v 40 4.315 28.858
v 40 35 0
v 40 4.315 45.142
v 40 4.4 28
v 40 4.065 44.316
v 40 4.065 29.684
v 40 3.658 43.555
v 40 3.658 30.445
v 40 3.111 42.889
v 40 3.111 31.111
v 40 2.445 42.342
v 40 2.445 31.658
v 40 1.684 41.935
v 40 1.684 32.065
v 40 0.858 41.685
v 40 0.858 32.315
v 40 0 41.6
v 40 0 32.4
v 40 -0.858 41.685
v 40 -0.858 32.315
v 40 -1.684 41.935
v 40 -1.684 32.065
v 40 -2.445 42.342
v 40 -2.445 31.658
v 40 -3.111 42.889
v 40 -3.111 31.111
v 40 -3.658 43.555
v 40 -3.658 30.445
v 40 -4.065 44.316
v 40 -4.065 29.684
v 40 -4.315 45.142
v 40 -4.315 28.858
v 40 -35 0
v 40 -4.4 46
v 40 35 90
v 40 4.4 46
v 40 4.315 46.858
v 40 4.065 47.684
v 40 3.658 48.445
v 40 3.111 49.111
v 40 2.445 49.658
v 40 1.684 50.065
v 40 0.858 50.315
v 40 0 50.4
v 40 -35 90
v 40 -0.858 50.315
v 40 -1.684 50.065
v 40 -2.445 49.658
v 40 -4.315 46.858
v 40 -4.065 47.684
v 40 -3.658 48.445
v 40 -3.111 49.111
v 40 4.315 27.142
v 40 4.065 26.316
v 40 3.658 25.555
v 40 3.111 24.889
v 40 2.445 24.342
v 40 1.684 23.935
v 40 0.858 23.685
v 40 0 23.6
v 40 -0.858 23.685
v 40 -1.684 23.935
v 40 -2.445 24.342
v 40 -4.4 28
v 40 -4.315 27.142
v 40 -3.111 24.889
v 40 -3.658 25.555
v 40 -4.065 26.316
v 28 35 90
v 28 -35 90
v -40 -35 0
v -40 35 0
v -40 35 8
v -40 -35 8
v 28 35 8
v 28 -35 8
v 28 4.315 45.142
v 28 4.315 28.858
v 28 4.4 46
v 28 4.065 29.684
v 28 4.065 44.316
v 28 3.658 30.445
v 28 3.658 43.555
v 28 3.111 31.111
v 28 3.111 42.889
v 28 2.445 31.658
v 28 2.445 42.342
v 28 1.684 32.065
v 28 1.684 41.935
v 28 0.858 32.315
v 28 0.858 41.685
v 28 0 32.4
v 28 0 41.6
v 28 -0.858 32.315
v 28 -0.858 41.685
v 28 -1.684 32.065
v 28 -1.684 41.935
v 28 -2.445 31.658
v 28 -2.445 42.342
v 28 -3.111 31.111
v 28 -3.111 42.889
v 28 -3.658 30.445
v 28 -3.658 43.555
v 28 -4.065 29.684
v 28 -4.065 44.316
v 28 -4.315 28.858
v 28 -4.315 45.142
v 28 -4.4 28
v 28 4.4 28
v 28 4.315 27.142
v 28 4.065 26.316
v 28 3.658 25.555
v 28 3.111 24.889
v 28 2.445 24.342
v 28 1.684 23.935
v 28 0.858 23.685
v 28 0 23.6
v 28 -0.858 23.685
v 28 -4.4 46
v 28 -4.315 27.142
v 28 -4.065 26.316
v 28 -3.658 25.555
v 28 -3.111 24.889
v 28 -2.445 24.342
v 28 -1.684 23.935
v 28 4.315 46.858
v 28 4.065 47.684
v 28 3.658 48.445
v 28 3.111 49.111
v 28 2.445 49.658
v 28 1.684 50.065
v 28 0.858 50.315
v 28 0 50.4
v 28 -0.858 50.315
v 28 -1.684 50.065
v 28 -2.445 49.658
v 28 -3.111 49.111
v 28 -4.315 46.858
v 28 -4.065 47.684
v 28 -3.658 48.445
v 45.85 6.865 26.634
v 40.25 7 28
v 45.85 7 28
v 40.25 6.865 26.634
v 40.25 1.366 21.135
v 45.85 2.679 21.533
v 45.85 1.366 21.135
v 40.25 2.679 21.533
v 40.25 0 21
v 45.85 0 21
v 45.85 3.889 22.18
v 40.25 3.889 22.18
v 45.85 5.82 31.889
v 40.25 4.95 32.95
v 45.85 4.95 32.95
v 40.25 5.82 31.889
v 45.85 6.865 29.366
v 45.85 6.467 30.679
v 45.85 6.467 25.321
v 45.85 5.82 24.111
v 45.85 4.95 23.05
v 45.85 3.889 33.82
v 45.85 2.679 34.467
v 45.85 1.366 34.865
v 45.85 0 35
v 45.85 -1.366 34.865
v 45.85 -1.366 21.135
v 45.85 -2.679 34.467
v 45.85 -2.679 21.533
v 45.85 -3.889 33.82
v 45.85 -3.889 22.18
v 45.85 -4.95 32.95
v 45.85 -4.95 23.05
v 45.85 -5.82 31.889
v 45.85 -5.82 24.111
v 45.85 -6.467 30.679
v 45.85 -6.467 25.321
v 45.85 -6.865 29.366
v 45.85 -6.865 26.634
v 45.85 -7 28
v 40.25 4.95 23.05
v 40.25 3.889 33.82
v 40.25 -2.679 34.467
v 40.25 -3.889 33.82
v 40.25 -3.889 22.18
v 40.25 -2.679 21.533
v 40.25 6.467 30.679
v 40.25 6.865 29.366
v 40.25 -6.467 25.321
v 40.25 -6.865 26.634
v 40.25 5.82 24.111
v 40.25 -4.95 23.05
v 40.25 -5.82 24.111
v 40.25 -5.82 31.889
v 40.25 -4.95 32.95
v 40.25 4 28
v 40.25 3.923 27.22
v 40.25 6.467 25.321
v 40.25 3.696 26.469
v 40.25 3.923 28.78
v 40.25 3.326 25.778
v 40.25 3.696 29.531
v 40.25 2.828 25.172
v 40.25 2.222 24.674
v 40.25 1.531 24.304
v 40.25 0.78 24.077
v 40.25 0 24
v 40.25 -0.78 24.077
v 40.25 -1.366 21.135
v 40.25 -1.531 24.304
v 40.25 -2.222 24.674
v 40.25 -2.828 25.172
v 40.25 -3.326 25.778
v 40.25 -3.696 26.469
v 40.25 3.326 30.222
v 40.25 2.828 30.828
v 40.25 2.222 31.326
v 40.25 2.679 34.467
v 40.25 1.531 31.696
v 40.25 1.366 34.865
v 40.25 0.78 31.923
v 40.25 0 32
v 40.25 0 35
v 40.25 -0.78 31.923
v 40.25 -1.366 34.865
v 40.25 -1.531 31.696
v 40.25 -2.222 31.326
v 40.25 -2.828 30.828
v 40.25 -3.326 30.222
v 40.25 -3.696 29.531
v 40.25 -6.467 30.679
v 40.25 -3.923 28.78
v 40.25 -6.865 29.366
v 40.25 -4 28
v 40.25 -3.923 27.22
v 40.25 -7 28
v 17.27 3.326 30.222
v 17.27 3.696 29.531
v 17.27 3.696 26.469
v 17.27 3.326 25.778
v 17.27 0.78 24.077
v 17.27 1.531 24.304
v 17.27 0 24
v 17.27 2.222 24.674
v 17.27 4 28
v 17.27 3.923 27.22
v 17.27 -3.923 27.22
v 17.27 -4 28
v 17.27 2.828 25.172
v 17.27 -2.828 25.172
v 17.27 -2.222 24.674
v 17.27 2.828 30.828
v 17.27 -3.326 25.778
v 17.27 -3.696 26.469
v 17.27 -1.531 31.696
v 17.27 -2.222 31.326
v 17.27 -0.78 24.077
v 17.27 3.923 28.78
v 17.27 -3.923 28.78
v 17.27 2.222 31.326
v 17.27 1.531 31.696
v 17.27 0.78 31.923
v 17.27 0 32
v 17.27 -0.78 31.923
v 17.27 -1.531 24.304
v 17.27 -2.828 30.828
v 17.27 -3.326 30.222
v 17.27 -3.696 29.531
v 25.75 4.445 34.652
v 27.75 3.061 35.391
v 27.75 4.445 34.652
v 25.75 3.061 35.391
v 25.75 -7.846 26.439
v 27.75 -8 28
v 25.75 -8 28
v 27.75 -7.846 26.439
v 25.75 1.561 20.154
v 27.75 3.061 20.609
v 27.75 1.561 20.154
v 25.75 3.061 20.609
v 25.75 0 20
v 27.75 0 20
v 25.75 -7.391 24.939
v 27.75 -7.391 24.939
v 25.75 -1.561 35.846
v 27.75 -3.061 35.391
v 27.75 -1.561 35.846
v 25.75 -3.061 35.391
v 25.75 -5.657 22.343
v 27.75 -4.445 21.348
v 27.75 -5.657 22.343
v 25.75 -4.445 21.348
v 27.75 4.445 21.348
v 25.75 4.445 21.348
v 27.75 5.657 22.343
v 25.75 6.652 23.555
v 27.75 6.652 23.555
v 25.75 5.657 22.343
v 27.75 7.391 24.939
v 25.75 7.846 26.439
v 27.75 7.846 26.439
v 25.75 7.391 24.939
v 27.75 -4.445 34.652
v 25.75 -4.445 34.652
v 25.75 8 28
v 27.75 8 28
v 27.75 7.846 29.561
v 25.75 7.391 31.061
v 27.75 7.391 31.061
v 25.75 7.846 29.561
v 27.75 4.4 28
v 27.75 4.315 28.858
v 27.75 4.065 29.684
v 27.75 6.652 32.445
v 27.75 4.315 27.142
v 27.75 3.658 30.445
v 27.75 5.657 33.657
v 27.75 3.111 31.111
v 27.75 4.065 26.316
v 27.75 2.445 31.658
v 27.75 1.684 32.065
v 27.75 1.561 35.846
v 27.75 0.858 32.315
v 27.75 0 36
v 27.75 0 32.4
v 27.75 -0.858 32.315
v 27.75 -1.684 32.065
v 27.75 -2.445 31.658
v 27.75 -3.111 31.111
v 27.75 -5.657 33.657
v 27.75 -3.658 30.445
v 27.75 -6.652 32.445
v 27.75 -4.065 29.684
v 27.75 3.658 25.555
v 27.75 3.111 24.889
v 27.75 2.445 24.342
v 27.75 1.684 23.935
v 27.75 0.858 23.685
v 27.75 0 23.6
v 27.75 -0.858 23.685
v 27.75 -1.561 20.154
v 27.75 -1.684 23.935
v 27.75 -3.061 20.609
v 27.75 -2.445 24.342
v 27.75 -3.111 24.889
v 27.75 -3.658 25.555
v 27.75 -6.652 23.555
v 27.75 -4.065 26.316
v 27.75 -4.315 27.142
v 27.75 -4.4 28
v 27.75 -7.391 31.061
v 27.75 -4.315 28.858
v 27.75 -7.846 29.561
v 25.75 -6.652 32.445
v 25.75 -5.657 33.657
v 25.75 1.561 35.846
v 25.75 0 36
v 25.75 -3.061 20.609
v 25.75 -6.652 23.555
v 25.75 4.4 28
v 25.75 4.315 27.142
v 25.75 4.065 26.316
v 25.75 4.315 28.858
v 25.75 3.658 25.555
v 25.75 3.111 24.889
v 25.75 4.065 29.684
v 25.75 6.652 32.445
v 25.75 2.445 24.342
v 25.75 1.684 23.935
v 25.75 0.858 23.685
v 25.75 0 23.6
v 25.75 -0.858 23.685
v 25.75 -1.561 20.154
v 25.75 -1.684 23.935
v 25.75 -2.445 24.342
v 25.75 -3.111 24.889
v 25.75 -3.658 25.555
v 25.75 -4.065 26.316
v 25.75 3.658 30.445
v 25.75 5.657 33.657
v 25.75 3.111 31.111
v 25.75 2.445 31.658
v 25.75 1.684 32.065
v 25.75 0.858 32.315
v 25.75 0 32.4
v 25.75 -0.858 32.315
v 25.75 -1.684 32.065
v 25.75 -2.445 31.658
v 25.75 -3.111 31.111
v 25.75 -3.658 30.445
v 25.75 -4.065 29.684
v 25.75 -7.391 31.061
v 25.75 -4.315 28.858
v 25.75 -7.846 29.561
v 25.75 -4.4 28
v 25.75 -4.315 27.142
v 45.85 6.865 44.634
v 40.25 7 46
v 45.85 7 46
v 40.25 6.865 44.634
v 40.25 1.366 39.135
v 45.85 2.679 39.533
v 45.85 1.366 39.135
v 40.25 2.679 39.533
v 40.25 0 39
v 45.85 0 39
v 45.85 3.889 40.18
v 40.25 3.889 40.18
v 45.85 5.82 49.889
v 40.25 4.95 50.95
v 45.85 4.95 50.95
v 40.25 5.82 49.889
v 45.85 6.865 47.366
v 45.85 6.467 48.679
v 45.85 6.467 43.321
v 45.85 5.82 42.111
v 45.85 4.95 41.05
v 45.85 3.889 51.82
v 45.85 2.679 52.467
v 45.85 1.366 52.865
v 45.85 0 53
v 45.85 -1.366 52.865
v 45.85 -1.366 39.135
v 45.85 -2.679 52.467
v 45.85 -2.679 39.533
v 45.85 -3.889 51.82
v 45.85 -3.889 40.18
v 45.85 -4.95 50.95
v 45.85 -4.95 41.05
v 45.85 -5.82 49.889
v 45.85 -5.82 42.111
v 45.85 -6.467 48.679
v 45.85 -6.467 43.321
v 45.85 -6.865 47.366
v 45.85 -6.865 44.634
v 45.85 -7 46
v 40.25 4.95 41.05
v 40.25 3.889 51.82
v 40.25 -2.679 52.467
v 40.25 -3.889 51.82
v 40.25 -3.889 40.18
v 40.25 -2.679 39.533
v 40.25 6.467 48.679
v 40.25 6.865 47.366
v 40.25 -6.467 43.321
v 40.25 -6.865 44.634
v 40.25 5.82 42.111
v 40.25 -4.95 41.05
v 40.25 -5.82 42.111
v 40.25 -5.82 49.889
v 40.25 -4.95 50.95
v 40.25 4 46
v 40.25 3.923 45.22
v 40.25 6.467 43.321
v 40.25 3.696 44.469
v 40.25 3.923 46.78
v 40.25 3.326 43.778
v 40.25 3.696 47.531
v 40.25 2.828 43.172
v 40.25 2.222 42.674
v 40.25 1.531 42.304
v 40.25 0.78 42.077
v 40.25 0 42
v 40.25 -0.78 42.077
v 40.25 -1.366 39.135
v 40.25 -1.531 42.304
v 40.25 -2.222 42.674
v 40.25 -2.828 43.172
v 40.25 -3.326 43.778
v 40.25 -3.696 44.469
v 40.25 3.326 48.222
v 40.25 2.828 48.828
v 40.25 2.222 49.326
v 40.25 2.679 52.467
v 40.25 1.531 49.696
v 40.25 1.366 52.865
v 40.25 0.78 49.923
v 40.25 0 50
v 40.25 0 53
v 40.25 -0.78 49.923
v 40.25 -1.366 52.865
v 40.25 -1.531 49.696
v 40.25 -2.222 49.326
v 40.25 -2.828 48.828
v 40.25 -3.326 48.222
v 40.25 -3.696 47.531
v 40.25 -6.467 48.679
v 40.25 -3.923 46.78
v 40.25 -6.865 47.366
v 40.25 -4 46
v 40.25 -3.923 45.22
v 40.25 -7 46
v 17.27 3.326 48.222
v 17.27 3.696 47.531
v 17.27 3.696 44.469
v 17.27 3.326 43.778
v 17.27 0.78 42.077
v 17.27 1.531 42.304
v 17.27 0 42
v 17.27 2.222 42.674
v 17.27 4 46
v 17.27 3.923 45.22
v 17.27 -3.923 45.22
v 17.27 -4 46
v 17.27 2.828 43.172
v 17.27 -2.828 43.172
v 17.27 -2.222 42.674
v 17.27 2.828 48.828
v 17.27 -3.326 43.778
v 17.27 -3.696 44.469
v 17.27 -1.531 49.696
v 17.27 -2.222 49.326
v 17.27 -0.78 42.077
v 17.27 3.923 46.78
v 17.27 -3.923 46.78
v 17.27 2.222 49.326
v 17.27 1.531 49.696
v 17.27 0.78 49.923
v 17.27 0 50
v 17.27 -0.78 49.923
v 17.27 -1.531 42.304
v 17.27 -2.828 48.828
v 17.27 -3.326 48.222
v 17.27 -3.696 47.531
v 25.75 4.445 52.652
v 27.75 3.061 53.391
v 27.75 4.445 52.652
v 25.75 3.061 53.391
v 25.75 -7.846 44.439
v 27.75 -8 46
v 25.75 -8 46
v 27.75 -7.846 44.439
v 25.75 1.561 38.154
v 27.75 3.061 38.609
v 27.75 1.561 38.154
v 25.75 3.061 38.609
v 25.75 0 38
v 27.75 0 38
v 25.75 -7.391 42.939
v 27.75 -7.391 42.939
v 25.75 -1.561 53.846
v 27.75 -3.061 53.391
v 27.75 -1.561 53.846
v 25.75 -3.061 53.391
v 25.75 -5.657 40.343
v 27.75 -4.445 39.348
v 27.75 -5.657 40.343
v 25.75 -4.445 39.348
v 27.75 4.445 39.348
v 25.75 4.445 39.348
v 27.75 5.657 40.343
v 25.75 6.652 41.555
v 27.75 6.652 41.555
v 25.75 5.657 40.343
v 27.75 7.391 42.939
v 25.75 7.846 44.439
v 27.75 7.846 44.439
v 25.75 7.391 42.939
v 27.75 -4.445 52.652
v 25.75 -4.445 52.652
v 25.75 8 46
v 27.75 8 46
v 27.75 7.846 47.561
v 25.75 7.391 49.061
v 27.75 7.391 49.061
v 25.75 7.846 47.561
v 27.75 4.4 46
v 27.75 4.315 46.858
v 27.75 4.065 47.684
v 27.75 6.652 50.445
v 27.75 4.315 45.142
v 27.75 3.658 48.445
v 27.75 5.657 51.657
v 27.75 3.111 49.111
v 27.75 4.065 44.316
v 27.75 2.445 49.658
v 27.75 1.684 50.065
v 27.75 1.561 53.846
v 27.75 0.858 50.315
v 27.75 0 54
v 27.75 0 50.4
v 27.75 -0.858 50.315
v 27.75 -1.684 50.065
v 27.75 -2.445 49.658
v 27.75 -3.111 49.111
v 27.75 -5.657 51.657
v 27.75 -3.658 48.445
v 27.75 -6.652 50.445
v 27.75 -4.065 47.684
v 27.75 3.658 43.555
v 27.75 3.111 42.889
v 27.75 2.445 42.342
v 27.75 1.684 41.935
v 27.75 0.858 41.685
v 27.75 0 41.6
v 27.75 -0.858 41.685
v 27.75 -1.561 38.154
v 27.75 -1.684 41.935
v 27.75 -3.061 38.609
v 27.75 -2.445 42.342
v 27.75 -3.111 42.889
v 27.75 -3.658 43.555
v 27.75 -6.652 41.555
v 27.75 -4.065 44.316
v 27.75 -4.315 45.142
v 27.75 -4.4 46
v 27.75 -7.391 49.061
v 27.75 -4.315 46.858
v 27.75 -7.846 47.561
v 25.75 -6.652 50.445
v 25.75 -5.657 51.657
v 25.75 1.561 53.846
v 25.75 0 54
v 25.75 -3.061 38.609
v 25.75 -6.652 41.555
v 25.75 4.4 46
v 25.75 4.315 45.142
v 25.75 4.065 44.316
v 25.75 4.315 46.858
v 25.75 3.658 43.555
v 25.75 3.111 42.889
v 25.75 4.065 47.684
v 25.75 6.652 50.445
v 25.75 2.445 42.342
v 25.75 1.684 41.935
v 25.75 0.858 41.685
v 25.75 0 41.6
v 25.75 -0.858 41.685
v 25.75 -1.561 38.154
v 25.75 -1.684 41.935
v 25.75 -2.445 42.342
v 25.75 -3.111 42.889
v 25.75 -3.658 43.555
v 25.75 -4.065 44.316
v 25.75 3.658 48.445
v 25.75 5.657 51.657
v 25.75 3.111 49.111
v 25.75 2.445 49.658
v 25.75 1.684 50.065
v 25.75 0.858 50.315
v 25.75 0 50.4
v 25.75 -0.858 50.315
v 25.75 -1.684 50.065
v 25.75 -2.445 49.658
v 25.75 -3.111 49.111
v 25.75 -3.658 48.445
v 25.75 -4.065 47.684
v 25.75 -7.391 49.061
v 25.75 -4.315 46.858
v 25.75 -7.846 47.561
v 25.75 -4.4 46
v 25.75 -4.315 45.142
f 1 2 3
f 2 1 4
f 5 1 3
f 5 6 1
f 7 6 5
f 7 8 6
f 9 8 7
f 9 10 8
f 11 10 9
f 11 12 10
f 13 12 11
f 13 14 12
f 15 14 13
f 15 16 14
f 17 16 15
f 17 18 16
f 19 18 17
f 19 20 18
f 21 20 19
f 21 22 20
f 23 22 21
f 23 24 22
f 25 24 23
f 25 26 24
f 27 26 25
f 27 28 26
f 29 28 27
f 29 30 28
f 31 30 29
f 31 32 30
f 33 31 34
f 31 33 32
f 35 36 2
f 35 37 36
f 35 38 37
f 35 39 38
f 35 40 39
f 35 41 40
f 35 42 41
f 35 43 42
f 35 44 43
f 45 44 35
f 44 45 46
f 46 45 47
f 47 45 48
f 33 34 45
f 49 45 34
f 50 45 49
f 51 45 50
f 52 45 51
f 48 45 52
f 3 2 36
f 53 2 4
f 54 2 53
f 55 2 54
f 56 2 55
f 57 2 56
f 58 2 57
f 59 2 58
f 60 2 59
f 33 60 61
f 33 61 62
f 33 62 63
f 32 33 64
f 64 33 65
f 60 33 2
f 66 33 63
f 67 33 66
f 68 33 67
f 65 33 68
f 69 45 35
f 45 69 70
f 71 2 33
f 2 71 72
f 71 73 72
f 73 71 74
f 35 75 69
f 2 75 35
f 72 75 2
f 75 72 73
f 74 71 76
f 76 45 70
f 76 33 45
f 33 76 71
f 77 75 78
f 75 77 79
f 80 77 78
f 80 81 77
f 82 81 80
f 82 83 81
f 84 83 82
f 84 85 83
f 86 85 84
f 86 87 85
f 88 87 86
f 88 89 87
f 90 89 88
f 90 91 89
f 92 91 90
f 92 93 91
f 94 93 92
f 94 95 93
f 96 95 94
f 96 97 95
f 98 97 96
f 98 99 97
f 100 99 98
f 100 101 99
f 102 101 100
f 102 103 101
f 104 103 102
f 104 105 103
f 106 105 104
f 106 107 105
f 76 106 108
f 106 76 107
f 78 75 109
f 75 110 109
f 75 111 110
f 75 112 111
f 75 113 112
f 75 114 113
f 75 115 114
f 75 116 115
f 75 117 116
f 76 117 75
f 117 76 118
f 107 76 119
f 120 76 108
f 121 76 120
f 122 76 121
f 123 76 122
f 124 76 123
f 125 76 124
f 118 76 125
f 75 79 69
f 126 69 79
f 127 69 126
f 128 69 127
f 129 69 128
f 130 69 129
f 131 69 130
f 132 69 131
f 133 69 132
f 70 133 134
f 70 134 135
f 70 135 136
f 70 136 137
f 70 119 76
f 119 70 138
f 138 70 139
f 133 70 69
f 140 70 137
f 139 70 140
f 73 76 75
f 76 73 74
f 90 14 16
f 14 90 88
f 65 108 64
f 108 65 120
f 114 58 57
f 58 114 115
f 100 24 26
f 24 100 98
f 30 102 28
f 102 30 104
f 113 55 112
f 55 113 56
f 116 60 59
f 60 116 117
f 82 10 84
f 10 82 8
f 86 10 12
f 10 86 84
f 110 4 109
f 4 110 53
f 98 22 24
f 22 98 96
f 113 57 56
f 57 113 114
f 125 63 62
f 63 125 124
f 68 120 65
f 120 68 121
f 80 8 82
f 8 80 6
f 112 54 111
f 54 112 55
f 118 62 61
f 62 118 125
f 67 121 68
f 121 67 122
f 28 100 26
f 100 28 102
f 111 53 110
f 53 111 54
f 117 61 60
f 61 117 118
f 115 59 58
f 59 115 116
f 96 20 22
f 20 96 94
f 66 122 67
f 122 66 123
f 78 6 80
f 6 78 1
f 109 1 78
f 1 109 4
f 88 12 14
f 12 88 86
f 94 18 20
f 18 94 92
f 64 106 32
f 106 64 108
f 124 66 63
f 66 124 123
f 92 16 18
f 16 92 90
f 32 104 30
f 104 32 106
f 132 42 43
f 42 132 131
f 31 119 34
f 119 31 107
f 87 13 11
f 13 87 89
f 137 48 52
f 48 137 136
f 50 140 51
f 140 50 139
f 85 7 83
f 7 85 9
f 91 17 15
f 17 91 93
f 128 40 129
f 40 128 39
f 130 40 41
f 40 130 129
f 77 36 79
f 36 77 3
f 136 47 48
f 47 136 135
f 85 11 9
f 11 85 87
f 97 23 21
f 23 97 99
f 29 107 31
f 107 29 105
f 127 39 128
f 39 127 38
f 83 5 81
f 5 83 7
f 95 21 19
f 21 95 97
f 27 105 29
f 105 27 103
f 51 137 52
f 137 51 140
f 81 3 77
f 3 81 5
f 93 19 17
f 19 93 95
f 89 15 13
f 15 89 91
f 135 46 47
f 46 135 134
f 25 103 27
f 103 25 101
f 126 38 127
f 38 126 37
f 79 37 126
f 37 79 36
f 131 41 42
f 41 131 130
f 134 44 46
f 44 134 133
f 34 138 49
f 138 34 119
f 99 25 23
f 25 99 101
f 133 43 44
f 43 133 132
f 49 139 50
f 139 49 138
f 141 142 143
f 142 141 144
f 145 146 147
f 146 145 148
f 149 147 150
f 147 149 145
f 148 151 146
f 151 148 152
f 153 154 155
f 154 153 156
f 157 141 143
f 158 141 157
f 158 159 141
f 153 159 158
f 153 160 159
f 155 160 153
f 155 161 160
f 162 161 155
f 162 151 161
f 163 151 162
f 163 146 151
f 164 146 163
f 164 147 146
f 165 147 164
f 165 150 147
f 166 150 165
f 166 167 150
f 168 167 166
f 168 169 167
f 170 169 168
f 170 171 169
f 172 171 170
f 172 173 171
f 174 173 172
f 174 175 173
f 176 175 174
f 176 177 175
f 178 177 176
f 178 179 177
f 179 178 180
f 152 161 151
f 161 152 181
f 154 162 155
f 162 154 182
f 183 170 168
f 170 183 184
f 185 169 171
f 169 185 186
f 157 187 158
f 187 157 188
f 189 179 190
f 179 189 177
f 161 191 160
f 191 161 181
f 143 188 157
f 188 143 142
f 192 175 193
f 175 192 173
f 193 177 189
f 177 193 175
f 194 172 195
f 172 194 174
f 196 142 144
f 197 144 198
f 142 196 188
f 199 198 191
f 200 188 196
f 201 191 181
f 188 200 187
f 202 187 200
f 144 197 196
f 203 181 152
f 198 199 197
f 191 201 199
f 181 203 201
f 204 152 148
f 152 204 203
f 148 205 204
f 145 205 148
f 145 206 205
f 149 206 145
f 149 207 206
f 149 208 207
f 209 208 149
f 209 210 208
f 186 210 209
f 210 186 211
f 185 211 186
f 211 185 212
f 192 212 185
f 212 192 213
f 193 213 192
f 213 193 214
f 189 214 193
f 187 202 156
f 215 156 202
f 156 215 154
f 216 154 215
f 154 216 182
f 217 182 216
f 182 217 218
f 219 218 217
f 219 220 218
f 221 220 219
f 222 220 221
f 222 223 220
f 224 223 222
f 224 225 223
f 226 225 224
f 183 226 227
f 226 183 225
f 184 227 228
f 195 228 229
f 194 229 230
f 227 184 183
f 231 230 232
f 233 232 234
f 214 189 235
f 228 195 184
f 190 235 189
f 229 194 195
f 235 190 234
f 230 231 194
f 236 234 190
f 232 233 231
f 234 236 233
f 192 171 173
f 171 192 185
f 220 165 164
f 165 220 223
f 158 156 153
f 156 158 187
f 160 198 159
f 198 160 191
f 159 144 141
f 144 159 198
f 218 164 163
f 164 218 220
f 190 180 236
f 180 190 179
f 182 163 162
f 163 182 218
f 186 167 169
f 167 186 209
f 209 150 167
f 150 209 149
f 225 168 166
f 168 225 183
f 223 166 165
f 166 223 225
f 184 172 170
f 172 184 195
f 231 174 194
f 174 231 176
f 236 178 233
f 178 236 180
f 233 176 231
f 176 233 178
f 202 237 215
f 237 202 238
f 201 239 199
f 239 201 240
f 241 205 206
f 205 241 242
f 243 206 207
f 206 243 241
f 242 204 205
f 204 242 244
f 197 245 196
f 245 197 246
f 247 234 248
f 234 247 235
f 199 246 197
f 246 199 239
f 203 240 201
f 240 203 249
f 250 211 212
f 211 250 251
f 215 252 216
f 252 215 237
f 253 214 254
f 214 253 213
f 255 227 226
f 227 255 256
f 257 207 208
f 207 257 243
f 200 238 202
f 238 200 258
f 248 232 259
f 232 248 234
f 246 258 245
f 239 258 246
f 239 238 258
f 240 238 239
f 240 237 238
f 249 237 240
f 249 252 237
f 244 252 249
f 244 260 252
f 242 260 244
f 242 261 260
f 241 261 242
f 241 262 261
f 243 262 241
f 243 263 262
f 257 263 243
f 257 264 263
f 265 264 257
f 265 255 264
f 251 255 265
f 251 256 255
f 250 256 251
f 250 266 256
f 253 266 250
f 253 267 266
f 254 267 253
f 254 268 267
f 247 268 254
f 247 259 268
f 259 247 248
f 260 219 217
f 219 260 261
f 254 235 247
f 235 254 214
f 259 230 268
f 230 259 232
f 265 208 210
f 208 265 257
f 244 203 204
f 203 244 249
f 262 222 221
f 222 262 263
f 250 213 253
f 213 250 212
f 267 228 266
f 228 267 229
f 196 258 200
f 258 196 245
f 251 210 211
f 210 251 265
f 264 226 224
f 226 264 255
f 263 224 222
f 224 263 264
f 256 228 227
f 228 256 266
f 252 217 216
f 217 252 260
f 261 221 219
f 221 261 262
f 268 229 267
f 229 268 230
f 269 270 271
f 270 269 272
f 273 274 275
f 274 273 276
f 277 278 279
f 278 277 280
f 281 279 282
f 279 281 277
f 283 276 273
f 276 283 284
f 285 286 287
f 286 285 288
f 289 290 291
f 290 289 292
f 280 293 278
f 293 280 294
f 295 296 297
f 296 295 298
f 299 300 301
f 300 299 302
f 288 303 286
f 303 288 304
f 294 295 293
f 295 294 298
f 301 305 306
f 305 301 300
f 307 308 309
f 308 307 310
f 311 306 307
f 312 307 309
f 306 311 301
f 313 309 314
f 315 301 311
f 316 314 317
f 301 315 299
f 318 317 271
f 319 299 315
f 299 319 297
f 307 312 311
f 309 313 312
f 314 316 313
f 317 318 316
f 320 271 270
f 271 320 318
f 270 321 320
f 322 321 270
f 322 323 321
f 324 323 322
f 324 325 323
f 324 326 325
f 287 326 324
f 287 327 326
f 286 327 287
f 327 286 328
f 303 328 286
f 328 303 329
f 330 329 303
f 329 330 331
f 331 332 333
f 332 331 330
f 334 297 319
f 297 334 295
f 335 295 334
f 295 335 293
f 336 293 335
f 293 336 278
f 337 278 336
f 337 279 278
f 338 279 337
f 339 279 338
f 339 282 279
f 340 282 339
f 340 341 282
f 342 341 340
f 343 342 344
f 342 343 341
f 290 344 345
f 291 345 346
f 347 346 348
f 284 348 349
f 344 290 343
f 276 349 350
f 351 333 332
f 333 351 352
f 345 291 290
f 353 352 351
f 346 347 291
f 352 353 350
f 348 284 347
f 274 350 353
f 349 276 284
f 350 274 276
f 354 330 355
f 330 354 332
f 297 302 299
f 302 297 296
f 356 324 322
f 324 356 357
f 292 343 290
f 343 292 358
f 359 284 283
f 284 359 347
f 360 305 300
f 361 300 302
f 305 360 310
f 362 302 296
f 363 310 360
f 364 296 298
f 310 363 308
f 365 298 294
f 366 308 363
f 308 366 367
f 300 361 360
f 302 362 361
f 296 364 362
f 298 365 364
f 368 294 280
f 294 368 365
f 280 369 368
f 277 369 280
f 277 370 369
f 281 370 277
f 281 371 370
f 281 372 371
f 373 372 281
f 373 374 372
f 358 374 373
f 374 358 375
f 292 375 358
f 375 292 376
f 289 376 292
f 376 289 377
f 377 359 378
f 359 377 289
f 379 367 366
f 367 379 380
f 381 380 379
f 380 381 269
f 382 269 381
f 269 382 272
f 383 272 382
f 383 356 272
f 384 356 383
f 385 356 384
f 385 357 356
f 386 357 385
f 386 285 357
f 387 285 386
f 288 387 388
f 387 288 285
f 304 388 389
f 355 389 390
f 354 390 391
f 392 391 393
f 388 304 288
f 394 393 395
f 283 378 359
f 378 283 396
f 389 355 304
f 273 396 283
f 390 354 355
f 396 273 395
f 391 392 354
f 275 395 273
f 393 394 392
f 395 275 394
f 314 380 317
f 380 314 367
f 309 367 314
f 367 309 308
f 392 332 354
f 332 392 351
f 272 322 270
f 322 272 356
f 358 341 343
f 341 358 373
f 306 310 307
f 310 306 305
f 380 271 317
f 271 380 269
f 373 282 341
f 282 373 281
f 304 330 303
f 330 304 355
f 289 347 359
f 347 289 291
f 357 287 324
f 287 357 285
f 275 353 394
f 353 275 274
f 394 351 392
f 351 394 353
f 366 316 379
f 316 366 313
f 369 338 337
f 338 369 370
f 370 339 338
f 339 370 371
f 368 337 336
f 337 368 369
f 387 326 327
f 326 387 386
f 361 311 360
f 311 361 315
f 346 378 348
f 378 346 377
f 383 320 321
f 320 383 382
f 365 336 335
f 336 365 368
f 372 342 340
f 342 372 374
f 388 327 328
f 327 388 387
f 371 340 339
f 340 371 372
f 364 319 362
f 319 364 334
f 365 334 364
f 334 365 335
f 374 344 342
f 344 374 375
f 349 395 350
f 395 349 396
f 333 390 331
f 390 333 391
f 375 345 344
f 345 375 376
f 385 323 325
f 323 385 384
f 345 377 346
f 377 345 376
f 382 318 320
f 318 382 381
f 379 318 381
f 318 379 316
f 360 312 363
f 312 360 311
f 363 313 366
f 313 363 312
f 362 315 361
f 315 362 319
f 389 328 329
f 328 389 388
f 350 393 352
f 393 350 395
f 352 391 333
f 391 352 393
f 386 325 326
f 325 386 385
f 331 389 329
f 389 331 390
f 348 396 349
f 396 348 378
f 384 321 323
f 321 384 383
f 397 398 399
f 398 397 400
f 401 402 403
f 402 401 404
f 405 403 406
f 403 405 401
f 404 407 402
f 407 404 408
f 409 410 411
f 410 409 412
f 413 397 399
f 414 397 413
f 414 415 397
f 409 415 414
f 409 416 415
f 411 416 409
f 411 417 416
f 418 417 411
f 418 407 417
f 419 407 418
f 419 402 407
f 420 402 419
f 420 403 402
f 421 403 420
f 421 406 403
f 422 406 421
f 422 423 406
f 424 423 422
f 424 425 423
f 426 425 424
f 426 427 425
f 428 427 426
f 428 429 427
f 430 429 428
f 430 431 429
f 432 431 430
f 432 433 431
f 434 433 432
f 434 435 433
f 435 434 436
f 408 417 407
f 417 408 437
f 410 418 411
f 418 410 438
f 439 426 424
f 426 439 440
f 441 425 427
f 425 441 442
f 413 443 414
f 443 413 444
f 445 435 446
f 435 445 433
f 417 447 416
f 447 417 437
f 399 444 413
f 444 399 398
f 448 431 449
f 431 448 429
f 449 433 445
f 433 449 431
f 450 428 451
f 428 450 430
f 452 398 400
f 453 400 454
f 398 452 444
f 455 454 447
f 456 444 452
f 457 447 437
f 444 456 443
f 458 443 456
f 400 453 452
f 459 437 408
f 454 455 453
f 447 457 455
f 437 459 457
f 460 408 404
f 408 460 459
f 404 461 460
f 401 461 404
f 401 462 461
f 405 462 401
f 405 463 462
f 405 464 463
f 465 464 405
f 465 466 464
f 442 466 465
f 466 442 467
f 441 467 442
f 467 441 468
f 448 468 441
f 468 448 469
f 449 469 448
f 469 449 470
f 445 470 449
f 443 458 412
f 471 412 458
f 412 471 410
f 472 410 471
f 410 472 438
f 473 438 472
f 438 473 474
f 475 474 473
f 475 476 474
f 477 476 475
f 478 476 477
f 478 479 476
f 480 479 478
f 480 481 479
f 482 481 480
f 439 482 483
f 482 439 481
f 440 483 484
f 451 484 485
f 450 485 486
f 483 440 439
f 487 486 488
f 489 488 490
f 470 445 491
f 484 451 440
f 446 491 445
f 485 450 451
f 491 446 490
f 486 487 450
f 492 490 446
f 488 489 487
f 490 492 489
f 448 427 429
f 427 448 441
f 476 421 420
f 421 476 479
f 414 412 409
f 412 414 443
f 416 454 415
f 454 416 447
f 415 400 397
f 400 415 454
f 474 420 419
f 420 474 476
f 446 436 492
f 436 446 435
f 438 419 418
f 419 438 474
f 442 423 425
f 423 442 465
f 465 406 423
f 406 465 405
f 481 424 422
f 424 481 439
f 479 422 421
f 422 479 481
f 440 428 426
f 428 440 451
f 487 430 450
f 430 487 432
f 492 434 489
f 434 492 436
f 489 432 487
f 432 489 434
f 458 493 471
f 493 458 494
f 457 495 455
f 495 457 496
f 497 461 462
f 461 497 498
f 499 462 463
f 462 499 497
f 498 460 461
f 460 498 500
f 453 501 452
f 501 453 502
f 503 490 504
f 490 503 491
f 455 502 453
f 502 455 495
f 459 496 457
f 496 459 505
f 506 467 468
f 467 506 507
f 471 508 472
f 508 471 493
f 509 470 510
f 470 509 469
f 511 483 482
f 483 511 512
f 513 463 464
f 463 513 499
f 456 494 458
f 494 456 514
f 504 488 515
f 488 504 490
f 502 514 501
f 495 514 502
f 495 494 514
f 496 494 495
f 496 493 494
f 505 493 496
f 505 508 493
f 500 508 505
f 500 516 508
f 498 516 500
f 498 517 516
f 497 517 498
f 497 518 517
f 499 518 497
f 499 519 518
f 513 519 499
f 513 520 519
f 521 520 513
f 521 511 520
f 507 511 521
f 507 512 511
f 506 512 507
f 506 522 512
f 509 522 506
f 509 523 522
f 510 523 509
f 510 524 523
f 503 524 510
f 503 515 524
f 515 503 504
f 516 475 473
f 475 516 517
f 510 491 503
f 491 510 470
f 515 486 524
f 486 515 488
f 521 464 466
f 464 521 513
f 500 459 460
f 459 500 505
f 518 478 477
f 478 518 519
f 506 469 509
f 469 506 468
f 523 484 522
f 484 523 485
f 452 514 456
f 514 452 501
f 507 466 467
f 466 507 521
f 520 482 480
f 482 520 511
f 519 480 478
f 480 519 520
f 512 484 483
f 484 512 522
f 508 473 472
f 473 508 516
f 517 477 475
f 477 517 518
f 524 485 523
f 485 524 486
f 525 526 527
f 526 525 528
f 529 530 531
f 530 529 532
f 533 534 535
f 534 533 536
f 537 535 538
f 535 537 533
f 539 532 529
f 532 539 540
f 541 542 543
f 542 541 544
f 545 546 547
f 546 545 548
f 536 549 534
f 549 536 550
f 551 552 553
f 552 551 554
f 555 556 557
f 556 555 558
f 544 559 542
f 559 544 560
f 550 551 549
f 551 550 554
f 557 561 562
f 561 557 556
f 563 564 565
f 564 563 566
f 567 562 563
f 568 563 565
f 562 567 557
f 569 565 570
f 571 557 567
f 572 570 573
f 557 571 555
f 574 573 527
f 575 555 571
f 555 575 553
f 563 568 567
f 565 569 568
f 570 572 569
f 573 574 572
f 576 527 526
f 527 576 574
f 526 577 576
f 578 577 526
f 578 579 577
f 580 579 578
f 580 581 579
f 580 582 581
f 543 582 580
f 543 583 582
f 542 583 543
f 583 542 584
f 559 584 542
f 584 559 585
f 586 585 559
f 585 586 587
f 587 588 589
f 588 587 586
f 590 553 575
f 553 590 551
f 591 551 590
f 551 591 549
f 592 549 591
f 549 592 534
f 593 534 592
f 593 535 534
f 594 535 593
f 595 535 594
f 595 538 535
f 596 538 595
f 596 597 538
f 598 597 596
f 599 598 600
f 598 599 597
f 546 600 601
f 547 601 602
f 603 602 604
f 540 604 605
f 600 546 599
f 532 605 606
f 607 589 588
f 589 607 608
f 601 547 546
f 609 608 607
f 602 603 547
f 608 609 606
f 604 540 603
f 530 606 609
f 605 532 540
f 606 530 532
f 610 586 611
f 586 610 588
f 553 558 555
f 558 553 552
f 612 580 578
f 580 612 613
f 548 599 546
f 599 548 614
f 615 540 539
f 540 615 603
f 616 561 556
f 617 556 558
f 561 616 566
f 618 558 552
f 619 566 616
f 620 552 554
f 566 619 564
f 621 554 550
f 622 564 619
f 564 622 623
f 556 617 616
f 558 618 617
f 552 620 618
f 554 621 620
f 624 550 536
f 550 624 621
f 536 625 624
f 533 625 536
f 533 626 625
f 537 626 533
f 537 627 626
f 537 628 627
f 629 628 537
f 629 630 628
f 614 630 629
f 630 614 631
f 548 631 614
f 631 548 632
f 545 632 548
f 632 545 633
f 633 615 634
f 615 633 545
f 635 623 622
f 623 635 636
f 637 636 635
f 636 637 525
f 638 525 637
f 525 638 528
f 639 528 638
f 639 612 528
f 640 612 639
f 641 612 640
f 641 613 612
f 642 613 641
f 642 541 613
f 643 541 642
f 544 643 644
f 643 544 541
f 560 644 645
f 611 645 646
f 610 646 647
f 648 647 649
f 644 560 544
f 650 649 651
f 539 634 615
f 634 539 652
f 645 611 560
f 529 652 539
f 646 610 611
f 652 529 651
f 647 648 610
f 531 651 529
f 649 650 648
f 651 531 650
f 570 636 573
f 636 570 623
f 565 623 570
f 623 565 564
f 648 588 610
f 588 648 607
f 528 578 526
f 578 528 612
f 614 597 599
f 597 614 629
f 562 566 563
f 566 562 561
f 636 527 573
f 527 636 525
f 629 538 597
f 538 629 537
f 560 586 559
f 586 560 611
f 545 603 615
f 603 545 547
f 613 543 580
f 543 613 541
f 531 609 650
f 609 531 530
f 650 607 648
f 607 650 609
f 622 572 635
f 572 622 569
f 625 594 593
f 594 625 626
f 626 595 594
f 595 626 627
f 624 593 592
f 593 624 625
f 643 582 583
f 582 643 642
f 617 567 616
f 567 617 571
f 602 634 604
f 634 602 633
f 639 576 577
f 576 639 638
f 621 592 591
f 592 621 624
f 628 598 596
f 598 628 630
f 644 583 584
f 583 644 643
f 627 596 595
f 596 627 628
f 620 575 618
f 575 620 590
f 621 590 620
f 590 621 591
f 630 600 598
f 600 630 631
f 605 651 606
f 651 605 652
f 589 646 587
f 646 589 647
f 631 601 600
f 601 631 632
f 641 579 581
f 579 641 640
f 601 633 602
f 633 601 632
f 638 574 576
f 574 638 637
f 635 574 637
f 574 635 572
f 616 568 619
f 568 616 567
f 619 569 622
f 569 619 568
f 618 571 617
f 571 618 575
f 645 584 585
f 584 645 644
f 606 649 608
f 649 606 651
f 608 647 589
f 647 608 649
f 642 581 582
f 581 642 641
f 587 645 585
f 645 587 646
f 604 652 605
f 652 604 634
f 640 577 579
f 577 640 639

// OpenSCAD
$fn = 32;

// ------------------------------------------------------------------------
// Bolted bracket: 80 x 70 mm bracket with 2 bolt joints
// Every part is its own module, assembly() places them once.
// ------------------------------------------------------------------------

// --- part 1 ---
module bracket() {
  difference() {
    translate([-40, -35, 0]) cube([80, 70, 90]);
    translate([-41, -36, 8]) cube([69, 72, 83]);
    translate([34, 0, 28]) rotate([0, 90, 0]) cylinder(h = 14, d = 8.8, center = true);
    translate([34, 0, 46]) rotate([0, 90, 0]) cylinder(h = 14, d = 8.8, center = true);
  }
}

// --- part 2 ---
module bolt1() {
  cylinder(h = 5.6, d = 14);
  translate([0, 0, -22.98]) cylinder(h = 22.98, d = 8);
}

// --- part 3 ---
module washer1() {
  difference() {
      translate([0, 0, 0]) cylinder(h = 2, d = 16);
      translate([0, 0, -1]) cylinder(h = 4, d = 8.8);
    }
}

// --- part 4 ---
module bolt2() {
  cylinder(h = 5.6, d = 14);
  translate([0, 0, -22.98]) cylinder(h = 22.98, d = 8);
}

// --- part 5 ---
module washer2() {
  difference() {
      translate([0, 0, 0]) cylinder(h = 2, d = 16);
      translate([0, 0, -1]) cylinder(h = 4, d = 8.8);
    }
}

// --- assembly ---
module assembly() {
  translate([0, 0, 0]) rotate([0, 0, 0]) bracket();
  translate([40.25, 0, 28]) rotate([0, 90, 0]) bolt1();
  translate([25.75, 0, 28]) rotate([0, 90, 0]) washer1();
  translate([40.25, 0, 46]) rotate([0, 90, 0]) bolt2();
  translate([25.75, 0, 46]) rotate([0, 90, 0]) washer2();
}

assembly();
